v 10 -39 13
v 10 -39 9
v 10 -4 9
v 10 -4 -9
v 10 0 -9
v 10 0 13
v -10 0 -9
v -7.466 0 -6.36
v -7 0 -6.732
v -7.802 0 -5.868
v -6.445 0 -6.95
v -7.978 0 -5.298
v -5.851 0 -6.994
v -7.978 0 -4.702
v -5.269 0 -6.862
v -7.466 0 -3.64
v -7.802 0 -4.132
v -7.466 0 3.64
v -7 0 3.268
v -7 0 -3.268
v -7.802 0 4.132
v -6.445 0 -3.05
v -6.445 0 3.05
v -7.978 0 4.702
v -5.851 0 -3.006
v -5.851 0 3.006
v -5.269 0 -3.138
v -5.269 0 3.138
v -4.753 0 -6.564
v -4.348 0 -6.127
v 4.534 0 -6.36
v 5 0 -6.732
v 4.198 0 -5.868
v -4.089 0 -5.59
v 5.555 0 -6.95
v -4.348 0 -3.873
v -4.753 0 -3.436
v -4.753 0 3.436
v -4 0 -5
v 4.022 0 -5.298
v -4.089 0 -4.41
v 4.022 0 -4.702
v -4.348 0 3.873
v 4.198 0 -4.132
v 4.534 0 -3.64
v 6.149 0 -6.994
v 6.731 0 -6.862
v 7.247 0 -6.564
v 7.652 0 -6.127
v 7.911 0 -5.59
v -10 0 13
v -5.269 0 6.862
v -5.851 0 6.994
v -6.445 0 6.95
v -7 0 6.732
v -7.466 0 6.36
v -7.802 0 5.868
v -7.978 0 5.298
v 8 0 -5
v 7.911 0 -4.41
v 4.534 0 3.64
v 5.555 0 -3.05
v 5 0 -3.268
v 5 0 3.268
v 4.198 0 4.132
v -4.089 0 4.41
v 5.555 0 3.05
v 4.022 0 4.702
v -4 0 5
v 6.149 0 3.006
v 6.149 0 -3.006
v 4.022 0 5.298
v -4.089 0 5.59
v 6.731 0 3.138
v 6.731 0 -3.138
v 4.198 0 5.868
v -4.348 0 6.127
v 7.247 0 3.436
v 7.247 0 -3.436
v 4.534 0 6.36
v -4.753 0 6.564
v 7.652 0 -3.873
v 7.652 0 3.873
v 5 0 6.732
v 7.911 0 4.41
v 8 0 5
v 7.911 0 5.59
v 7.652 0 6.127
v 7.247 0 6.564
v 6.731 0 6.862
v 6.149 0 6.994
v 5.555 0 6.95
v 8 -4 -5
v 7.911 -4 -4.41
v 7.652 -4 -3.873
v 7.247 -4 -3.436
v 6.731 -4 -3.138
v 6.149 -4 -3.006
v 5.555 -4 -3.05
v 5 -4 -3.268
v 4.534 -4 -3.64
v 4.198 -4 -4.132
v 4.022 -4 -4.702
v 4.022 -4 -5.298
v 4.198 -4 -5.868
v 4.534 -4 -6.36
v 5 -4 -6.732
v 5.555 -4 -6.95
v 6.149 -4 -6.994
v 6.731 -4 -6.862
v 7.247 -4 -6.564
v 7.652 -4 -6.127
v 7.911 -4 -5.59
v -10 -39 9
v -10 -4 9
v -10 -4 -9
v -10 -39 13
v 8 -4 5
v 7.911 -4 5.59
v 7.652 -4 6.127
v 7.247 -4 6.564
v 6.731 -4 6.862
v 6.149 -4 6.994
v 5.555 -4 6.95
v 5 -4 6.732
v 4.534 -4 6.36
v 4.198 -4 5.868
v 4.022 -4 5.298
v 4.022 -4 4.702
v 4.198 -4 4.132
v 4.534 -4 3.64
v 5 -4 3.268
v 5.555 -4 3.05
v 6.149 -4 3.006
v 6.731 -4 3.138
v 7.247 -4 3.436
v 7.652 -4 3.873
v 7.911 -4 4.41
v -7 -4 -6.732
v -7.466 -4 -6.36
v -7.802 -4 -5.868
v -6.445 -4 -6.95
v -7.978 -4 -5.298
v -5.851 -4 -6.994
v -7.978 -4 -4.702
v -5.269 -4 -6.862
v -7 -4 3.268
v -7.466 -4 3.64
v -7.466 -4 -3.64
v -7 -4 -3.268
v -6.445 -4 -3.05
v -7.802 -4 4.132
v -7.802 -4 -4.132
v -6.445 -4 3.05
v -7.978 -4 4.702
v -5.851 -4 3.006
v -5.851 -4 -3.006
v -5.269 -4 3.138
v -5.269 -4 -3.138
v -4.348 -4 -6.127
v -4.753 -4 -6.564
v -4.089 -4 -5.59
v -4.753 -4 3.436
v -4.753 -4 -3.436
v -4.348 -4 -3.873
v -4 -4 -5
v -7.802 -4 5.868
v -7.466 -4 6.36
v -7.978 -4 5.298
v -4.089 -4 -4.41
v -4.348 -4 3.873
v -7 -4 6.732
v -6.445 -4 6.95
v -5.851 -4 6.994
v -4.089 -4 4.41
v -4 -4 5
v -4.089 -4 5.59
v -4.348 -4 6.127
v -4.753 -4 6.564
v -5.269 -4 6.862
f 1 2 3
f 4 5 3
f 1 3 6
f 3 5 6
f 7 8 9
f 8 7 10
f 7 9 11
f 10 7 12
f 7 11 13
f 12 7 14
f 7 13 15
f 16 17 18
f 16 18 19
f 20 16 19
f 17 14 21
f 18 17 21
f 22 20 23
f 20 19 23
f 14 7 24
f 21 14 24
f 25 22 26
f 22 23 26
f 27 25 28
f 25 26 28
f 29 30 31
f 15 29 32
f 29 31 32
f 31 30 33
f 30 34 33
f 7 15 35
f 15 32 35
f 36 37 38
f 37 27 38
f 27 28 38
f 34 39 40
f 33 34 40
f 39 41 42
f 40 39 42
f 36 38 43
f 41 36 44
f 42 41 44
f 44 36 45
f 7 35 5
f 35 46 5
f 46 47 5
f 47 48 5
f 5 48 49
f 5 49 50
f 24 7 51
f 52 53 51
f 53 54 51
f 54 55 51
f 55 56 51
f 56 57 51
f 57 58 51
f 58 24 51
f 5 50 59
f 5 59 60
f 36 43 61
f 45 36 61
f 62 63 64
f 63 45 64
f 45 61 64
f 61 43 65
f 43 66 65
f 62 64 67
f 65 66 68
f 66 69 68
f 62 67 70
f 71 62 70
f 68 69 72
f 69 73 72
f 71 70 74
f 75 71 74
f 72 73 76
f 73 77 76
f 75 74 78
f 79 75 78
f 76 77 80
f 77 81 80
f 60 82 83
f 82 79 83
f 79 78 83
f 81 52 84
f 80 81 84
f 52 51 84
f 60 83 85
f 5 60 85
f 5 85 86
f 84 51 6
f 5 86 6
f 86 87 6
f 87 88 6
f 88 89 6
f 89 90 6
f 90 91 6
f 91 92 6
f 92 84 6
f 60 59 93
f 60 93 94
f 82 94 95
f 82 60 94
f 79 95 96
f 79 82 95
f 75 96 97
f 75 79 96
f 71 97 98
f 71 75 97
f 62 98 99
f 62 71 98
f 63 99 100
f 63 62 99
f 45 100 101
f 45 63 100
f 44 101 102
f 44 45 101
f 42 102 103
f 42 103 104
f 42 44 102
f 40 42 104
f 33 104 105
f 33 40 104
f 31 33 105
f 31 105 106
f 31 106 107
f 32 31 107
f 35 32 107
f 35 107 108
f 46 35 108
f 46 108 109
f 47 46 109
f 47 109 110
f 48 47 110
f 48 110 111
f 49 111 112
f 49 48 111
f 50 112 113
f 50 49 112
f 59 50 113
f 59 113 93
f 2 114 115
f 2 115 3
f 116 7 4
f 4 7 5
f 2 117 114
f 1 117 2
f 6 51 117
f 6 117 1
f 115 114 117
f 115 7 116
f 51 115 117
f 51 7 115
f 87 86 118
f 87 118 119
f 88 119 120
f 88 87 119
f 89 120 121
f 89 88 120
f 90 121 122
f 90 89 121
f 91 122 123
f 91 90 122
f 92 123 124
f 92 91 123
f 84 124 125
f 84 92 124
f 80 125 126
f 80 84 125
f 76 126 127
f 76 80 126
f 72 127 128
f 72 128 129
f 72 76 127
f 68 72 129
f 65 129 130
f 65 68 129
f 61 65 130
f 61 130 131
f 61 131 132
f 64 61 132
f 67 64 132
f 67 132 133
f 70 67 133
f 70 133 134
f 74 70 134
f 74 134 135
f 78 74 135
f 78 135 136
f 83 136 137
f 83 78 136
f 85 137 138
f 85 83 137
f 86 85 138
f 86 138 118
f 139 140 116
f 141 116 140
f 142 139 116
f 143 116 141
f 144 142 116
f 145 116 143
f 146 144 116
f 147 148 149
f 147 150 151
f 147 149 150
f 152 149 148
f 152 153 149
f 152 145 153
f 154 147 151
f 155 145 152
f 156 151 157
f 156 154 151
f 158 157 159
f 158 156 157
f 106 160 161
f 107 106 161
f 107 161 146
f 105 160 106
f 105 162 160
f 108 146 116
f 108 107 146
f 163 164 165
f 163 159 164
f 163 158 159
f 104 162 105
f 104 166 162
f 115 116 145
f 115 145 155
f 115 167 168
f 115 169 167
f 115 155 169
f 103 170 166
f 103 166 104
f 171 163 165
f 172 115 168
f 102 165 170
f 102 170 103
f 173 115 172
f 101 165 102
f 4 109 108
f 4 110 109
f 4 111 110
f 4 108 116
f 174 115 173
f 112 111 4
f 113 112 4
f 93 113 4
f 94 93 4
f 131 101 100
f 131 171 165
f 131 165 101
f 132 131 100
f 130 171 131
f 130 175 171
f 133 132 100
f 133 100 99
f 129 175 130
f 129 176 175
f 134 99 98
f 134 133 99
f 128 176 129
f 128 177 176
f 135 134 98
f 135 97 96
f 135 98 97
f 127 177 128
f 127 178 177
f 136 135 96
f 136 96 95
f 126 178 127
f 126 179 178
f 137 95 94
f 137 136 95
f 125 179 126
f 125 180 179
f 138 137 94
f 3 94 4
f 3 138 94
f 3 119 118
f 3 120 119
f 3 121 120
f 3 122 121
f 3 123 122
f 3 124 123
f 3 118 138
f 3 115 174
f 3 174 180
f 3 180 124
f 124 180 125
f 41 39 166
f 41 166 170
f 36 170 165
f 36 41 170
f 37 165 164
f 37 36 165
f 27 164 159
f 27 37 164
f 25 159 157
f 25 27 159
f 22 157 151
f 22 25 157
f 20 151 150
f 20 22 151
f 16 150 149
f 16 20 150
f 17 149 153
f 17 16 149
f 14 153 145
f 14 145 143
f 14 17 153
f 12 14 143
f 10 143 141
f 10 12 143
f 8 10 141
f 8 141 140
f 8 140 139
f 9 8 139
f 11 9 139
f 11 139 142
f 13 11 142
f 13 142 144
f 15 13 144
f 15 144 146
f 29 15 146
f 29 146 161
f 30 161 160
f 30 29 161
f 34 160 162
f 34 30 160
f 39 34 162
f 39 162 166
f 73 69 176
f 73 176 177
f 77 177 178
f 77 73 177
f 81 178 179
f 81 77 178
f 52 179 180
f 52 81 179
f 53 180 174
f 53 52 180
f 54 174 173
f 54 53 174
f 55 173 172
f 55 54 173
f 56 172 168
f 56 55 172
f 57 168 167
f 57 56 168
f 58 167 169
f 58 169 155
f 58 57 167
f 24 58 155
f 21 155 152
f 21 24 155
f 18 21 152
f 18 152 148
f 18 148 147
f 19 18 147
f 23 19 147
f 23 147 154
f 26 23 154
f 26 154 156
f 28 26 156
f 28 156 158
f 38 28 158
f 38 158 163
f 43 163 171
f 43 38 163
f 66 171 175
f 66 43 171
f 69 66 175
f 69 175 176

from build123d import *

# Parameters (mm, degrees)
F0_W     = 20
F0_H     = 22
F0_R     = 2
F1_DEPTH = 4
F2_W     = 20
F2_H     = 4
F3_DEPTH = 35


with BuildPart() as f1:
    # F0 (on Front) → F1 (new body)
    with BuildSketch(Plane.XZ):
        with Locations((0, 2)):
            Rectangle(F0_W, F0_H)
        with Locations((-6, -5)):
            Circle(F0_R, mode=Mode.SUBTRACT)
        with Locations((6, -5)):
            Circle(F0_R, mode=Mode.SUBTRACT)
        with Locations((-6, 5)):
            Circle(F0_R, mode=Mode.SUBTRACT)
        with Locations((6, 5)):
            Circle(F0_R, mode=Mode.SUBTRACT)
    extrude(amount=F1_DEPTH)

    # F2 (on face) → F3 (join)
    with BuildSketch(Plane.XZ.offset(4)):
        with Locations((0, 11)):
            Rectangle(F2_W, F2_H)
    extrude(amount=F3_DEPTH)


solid = f1.part
